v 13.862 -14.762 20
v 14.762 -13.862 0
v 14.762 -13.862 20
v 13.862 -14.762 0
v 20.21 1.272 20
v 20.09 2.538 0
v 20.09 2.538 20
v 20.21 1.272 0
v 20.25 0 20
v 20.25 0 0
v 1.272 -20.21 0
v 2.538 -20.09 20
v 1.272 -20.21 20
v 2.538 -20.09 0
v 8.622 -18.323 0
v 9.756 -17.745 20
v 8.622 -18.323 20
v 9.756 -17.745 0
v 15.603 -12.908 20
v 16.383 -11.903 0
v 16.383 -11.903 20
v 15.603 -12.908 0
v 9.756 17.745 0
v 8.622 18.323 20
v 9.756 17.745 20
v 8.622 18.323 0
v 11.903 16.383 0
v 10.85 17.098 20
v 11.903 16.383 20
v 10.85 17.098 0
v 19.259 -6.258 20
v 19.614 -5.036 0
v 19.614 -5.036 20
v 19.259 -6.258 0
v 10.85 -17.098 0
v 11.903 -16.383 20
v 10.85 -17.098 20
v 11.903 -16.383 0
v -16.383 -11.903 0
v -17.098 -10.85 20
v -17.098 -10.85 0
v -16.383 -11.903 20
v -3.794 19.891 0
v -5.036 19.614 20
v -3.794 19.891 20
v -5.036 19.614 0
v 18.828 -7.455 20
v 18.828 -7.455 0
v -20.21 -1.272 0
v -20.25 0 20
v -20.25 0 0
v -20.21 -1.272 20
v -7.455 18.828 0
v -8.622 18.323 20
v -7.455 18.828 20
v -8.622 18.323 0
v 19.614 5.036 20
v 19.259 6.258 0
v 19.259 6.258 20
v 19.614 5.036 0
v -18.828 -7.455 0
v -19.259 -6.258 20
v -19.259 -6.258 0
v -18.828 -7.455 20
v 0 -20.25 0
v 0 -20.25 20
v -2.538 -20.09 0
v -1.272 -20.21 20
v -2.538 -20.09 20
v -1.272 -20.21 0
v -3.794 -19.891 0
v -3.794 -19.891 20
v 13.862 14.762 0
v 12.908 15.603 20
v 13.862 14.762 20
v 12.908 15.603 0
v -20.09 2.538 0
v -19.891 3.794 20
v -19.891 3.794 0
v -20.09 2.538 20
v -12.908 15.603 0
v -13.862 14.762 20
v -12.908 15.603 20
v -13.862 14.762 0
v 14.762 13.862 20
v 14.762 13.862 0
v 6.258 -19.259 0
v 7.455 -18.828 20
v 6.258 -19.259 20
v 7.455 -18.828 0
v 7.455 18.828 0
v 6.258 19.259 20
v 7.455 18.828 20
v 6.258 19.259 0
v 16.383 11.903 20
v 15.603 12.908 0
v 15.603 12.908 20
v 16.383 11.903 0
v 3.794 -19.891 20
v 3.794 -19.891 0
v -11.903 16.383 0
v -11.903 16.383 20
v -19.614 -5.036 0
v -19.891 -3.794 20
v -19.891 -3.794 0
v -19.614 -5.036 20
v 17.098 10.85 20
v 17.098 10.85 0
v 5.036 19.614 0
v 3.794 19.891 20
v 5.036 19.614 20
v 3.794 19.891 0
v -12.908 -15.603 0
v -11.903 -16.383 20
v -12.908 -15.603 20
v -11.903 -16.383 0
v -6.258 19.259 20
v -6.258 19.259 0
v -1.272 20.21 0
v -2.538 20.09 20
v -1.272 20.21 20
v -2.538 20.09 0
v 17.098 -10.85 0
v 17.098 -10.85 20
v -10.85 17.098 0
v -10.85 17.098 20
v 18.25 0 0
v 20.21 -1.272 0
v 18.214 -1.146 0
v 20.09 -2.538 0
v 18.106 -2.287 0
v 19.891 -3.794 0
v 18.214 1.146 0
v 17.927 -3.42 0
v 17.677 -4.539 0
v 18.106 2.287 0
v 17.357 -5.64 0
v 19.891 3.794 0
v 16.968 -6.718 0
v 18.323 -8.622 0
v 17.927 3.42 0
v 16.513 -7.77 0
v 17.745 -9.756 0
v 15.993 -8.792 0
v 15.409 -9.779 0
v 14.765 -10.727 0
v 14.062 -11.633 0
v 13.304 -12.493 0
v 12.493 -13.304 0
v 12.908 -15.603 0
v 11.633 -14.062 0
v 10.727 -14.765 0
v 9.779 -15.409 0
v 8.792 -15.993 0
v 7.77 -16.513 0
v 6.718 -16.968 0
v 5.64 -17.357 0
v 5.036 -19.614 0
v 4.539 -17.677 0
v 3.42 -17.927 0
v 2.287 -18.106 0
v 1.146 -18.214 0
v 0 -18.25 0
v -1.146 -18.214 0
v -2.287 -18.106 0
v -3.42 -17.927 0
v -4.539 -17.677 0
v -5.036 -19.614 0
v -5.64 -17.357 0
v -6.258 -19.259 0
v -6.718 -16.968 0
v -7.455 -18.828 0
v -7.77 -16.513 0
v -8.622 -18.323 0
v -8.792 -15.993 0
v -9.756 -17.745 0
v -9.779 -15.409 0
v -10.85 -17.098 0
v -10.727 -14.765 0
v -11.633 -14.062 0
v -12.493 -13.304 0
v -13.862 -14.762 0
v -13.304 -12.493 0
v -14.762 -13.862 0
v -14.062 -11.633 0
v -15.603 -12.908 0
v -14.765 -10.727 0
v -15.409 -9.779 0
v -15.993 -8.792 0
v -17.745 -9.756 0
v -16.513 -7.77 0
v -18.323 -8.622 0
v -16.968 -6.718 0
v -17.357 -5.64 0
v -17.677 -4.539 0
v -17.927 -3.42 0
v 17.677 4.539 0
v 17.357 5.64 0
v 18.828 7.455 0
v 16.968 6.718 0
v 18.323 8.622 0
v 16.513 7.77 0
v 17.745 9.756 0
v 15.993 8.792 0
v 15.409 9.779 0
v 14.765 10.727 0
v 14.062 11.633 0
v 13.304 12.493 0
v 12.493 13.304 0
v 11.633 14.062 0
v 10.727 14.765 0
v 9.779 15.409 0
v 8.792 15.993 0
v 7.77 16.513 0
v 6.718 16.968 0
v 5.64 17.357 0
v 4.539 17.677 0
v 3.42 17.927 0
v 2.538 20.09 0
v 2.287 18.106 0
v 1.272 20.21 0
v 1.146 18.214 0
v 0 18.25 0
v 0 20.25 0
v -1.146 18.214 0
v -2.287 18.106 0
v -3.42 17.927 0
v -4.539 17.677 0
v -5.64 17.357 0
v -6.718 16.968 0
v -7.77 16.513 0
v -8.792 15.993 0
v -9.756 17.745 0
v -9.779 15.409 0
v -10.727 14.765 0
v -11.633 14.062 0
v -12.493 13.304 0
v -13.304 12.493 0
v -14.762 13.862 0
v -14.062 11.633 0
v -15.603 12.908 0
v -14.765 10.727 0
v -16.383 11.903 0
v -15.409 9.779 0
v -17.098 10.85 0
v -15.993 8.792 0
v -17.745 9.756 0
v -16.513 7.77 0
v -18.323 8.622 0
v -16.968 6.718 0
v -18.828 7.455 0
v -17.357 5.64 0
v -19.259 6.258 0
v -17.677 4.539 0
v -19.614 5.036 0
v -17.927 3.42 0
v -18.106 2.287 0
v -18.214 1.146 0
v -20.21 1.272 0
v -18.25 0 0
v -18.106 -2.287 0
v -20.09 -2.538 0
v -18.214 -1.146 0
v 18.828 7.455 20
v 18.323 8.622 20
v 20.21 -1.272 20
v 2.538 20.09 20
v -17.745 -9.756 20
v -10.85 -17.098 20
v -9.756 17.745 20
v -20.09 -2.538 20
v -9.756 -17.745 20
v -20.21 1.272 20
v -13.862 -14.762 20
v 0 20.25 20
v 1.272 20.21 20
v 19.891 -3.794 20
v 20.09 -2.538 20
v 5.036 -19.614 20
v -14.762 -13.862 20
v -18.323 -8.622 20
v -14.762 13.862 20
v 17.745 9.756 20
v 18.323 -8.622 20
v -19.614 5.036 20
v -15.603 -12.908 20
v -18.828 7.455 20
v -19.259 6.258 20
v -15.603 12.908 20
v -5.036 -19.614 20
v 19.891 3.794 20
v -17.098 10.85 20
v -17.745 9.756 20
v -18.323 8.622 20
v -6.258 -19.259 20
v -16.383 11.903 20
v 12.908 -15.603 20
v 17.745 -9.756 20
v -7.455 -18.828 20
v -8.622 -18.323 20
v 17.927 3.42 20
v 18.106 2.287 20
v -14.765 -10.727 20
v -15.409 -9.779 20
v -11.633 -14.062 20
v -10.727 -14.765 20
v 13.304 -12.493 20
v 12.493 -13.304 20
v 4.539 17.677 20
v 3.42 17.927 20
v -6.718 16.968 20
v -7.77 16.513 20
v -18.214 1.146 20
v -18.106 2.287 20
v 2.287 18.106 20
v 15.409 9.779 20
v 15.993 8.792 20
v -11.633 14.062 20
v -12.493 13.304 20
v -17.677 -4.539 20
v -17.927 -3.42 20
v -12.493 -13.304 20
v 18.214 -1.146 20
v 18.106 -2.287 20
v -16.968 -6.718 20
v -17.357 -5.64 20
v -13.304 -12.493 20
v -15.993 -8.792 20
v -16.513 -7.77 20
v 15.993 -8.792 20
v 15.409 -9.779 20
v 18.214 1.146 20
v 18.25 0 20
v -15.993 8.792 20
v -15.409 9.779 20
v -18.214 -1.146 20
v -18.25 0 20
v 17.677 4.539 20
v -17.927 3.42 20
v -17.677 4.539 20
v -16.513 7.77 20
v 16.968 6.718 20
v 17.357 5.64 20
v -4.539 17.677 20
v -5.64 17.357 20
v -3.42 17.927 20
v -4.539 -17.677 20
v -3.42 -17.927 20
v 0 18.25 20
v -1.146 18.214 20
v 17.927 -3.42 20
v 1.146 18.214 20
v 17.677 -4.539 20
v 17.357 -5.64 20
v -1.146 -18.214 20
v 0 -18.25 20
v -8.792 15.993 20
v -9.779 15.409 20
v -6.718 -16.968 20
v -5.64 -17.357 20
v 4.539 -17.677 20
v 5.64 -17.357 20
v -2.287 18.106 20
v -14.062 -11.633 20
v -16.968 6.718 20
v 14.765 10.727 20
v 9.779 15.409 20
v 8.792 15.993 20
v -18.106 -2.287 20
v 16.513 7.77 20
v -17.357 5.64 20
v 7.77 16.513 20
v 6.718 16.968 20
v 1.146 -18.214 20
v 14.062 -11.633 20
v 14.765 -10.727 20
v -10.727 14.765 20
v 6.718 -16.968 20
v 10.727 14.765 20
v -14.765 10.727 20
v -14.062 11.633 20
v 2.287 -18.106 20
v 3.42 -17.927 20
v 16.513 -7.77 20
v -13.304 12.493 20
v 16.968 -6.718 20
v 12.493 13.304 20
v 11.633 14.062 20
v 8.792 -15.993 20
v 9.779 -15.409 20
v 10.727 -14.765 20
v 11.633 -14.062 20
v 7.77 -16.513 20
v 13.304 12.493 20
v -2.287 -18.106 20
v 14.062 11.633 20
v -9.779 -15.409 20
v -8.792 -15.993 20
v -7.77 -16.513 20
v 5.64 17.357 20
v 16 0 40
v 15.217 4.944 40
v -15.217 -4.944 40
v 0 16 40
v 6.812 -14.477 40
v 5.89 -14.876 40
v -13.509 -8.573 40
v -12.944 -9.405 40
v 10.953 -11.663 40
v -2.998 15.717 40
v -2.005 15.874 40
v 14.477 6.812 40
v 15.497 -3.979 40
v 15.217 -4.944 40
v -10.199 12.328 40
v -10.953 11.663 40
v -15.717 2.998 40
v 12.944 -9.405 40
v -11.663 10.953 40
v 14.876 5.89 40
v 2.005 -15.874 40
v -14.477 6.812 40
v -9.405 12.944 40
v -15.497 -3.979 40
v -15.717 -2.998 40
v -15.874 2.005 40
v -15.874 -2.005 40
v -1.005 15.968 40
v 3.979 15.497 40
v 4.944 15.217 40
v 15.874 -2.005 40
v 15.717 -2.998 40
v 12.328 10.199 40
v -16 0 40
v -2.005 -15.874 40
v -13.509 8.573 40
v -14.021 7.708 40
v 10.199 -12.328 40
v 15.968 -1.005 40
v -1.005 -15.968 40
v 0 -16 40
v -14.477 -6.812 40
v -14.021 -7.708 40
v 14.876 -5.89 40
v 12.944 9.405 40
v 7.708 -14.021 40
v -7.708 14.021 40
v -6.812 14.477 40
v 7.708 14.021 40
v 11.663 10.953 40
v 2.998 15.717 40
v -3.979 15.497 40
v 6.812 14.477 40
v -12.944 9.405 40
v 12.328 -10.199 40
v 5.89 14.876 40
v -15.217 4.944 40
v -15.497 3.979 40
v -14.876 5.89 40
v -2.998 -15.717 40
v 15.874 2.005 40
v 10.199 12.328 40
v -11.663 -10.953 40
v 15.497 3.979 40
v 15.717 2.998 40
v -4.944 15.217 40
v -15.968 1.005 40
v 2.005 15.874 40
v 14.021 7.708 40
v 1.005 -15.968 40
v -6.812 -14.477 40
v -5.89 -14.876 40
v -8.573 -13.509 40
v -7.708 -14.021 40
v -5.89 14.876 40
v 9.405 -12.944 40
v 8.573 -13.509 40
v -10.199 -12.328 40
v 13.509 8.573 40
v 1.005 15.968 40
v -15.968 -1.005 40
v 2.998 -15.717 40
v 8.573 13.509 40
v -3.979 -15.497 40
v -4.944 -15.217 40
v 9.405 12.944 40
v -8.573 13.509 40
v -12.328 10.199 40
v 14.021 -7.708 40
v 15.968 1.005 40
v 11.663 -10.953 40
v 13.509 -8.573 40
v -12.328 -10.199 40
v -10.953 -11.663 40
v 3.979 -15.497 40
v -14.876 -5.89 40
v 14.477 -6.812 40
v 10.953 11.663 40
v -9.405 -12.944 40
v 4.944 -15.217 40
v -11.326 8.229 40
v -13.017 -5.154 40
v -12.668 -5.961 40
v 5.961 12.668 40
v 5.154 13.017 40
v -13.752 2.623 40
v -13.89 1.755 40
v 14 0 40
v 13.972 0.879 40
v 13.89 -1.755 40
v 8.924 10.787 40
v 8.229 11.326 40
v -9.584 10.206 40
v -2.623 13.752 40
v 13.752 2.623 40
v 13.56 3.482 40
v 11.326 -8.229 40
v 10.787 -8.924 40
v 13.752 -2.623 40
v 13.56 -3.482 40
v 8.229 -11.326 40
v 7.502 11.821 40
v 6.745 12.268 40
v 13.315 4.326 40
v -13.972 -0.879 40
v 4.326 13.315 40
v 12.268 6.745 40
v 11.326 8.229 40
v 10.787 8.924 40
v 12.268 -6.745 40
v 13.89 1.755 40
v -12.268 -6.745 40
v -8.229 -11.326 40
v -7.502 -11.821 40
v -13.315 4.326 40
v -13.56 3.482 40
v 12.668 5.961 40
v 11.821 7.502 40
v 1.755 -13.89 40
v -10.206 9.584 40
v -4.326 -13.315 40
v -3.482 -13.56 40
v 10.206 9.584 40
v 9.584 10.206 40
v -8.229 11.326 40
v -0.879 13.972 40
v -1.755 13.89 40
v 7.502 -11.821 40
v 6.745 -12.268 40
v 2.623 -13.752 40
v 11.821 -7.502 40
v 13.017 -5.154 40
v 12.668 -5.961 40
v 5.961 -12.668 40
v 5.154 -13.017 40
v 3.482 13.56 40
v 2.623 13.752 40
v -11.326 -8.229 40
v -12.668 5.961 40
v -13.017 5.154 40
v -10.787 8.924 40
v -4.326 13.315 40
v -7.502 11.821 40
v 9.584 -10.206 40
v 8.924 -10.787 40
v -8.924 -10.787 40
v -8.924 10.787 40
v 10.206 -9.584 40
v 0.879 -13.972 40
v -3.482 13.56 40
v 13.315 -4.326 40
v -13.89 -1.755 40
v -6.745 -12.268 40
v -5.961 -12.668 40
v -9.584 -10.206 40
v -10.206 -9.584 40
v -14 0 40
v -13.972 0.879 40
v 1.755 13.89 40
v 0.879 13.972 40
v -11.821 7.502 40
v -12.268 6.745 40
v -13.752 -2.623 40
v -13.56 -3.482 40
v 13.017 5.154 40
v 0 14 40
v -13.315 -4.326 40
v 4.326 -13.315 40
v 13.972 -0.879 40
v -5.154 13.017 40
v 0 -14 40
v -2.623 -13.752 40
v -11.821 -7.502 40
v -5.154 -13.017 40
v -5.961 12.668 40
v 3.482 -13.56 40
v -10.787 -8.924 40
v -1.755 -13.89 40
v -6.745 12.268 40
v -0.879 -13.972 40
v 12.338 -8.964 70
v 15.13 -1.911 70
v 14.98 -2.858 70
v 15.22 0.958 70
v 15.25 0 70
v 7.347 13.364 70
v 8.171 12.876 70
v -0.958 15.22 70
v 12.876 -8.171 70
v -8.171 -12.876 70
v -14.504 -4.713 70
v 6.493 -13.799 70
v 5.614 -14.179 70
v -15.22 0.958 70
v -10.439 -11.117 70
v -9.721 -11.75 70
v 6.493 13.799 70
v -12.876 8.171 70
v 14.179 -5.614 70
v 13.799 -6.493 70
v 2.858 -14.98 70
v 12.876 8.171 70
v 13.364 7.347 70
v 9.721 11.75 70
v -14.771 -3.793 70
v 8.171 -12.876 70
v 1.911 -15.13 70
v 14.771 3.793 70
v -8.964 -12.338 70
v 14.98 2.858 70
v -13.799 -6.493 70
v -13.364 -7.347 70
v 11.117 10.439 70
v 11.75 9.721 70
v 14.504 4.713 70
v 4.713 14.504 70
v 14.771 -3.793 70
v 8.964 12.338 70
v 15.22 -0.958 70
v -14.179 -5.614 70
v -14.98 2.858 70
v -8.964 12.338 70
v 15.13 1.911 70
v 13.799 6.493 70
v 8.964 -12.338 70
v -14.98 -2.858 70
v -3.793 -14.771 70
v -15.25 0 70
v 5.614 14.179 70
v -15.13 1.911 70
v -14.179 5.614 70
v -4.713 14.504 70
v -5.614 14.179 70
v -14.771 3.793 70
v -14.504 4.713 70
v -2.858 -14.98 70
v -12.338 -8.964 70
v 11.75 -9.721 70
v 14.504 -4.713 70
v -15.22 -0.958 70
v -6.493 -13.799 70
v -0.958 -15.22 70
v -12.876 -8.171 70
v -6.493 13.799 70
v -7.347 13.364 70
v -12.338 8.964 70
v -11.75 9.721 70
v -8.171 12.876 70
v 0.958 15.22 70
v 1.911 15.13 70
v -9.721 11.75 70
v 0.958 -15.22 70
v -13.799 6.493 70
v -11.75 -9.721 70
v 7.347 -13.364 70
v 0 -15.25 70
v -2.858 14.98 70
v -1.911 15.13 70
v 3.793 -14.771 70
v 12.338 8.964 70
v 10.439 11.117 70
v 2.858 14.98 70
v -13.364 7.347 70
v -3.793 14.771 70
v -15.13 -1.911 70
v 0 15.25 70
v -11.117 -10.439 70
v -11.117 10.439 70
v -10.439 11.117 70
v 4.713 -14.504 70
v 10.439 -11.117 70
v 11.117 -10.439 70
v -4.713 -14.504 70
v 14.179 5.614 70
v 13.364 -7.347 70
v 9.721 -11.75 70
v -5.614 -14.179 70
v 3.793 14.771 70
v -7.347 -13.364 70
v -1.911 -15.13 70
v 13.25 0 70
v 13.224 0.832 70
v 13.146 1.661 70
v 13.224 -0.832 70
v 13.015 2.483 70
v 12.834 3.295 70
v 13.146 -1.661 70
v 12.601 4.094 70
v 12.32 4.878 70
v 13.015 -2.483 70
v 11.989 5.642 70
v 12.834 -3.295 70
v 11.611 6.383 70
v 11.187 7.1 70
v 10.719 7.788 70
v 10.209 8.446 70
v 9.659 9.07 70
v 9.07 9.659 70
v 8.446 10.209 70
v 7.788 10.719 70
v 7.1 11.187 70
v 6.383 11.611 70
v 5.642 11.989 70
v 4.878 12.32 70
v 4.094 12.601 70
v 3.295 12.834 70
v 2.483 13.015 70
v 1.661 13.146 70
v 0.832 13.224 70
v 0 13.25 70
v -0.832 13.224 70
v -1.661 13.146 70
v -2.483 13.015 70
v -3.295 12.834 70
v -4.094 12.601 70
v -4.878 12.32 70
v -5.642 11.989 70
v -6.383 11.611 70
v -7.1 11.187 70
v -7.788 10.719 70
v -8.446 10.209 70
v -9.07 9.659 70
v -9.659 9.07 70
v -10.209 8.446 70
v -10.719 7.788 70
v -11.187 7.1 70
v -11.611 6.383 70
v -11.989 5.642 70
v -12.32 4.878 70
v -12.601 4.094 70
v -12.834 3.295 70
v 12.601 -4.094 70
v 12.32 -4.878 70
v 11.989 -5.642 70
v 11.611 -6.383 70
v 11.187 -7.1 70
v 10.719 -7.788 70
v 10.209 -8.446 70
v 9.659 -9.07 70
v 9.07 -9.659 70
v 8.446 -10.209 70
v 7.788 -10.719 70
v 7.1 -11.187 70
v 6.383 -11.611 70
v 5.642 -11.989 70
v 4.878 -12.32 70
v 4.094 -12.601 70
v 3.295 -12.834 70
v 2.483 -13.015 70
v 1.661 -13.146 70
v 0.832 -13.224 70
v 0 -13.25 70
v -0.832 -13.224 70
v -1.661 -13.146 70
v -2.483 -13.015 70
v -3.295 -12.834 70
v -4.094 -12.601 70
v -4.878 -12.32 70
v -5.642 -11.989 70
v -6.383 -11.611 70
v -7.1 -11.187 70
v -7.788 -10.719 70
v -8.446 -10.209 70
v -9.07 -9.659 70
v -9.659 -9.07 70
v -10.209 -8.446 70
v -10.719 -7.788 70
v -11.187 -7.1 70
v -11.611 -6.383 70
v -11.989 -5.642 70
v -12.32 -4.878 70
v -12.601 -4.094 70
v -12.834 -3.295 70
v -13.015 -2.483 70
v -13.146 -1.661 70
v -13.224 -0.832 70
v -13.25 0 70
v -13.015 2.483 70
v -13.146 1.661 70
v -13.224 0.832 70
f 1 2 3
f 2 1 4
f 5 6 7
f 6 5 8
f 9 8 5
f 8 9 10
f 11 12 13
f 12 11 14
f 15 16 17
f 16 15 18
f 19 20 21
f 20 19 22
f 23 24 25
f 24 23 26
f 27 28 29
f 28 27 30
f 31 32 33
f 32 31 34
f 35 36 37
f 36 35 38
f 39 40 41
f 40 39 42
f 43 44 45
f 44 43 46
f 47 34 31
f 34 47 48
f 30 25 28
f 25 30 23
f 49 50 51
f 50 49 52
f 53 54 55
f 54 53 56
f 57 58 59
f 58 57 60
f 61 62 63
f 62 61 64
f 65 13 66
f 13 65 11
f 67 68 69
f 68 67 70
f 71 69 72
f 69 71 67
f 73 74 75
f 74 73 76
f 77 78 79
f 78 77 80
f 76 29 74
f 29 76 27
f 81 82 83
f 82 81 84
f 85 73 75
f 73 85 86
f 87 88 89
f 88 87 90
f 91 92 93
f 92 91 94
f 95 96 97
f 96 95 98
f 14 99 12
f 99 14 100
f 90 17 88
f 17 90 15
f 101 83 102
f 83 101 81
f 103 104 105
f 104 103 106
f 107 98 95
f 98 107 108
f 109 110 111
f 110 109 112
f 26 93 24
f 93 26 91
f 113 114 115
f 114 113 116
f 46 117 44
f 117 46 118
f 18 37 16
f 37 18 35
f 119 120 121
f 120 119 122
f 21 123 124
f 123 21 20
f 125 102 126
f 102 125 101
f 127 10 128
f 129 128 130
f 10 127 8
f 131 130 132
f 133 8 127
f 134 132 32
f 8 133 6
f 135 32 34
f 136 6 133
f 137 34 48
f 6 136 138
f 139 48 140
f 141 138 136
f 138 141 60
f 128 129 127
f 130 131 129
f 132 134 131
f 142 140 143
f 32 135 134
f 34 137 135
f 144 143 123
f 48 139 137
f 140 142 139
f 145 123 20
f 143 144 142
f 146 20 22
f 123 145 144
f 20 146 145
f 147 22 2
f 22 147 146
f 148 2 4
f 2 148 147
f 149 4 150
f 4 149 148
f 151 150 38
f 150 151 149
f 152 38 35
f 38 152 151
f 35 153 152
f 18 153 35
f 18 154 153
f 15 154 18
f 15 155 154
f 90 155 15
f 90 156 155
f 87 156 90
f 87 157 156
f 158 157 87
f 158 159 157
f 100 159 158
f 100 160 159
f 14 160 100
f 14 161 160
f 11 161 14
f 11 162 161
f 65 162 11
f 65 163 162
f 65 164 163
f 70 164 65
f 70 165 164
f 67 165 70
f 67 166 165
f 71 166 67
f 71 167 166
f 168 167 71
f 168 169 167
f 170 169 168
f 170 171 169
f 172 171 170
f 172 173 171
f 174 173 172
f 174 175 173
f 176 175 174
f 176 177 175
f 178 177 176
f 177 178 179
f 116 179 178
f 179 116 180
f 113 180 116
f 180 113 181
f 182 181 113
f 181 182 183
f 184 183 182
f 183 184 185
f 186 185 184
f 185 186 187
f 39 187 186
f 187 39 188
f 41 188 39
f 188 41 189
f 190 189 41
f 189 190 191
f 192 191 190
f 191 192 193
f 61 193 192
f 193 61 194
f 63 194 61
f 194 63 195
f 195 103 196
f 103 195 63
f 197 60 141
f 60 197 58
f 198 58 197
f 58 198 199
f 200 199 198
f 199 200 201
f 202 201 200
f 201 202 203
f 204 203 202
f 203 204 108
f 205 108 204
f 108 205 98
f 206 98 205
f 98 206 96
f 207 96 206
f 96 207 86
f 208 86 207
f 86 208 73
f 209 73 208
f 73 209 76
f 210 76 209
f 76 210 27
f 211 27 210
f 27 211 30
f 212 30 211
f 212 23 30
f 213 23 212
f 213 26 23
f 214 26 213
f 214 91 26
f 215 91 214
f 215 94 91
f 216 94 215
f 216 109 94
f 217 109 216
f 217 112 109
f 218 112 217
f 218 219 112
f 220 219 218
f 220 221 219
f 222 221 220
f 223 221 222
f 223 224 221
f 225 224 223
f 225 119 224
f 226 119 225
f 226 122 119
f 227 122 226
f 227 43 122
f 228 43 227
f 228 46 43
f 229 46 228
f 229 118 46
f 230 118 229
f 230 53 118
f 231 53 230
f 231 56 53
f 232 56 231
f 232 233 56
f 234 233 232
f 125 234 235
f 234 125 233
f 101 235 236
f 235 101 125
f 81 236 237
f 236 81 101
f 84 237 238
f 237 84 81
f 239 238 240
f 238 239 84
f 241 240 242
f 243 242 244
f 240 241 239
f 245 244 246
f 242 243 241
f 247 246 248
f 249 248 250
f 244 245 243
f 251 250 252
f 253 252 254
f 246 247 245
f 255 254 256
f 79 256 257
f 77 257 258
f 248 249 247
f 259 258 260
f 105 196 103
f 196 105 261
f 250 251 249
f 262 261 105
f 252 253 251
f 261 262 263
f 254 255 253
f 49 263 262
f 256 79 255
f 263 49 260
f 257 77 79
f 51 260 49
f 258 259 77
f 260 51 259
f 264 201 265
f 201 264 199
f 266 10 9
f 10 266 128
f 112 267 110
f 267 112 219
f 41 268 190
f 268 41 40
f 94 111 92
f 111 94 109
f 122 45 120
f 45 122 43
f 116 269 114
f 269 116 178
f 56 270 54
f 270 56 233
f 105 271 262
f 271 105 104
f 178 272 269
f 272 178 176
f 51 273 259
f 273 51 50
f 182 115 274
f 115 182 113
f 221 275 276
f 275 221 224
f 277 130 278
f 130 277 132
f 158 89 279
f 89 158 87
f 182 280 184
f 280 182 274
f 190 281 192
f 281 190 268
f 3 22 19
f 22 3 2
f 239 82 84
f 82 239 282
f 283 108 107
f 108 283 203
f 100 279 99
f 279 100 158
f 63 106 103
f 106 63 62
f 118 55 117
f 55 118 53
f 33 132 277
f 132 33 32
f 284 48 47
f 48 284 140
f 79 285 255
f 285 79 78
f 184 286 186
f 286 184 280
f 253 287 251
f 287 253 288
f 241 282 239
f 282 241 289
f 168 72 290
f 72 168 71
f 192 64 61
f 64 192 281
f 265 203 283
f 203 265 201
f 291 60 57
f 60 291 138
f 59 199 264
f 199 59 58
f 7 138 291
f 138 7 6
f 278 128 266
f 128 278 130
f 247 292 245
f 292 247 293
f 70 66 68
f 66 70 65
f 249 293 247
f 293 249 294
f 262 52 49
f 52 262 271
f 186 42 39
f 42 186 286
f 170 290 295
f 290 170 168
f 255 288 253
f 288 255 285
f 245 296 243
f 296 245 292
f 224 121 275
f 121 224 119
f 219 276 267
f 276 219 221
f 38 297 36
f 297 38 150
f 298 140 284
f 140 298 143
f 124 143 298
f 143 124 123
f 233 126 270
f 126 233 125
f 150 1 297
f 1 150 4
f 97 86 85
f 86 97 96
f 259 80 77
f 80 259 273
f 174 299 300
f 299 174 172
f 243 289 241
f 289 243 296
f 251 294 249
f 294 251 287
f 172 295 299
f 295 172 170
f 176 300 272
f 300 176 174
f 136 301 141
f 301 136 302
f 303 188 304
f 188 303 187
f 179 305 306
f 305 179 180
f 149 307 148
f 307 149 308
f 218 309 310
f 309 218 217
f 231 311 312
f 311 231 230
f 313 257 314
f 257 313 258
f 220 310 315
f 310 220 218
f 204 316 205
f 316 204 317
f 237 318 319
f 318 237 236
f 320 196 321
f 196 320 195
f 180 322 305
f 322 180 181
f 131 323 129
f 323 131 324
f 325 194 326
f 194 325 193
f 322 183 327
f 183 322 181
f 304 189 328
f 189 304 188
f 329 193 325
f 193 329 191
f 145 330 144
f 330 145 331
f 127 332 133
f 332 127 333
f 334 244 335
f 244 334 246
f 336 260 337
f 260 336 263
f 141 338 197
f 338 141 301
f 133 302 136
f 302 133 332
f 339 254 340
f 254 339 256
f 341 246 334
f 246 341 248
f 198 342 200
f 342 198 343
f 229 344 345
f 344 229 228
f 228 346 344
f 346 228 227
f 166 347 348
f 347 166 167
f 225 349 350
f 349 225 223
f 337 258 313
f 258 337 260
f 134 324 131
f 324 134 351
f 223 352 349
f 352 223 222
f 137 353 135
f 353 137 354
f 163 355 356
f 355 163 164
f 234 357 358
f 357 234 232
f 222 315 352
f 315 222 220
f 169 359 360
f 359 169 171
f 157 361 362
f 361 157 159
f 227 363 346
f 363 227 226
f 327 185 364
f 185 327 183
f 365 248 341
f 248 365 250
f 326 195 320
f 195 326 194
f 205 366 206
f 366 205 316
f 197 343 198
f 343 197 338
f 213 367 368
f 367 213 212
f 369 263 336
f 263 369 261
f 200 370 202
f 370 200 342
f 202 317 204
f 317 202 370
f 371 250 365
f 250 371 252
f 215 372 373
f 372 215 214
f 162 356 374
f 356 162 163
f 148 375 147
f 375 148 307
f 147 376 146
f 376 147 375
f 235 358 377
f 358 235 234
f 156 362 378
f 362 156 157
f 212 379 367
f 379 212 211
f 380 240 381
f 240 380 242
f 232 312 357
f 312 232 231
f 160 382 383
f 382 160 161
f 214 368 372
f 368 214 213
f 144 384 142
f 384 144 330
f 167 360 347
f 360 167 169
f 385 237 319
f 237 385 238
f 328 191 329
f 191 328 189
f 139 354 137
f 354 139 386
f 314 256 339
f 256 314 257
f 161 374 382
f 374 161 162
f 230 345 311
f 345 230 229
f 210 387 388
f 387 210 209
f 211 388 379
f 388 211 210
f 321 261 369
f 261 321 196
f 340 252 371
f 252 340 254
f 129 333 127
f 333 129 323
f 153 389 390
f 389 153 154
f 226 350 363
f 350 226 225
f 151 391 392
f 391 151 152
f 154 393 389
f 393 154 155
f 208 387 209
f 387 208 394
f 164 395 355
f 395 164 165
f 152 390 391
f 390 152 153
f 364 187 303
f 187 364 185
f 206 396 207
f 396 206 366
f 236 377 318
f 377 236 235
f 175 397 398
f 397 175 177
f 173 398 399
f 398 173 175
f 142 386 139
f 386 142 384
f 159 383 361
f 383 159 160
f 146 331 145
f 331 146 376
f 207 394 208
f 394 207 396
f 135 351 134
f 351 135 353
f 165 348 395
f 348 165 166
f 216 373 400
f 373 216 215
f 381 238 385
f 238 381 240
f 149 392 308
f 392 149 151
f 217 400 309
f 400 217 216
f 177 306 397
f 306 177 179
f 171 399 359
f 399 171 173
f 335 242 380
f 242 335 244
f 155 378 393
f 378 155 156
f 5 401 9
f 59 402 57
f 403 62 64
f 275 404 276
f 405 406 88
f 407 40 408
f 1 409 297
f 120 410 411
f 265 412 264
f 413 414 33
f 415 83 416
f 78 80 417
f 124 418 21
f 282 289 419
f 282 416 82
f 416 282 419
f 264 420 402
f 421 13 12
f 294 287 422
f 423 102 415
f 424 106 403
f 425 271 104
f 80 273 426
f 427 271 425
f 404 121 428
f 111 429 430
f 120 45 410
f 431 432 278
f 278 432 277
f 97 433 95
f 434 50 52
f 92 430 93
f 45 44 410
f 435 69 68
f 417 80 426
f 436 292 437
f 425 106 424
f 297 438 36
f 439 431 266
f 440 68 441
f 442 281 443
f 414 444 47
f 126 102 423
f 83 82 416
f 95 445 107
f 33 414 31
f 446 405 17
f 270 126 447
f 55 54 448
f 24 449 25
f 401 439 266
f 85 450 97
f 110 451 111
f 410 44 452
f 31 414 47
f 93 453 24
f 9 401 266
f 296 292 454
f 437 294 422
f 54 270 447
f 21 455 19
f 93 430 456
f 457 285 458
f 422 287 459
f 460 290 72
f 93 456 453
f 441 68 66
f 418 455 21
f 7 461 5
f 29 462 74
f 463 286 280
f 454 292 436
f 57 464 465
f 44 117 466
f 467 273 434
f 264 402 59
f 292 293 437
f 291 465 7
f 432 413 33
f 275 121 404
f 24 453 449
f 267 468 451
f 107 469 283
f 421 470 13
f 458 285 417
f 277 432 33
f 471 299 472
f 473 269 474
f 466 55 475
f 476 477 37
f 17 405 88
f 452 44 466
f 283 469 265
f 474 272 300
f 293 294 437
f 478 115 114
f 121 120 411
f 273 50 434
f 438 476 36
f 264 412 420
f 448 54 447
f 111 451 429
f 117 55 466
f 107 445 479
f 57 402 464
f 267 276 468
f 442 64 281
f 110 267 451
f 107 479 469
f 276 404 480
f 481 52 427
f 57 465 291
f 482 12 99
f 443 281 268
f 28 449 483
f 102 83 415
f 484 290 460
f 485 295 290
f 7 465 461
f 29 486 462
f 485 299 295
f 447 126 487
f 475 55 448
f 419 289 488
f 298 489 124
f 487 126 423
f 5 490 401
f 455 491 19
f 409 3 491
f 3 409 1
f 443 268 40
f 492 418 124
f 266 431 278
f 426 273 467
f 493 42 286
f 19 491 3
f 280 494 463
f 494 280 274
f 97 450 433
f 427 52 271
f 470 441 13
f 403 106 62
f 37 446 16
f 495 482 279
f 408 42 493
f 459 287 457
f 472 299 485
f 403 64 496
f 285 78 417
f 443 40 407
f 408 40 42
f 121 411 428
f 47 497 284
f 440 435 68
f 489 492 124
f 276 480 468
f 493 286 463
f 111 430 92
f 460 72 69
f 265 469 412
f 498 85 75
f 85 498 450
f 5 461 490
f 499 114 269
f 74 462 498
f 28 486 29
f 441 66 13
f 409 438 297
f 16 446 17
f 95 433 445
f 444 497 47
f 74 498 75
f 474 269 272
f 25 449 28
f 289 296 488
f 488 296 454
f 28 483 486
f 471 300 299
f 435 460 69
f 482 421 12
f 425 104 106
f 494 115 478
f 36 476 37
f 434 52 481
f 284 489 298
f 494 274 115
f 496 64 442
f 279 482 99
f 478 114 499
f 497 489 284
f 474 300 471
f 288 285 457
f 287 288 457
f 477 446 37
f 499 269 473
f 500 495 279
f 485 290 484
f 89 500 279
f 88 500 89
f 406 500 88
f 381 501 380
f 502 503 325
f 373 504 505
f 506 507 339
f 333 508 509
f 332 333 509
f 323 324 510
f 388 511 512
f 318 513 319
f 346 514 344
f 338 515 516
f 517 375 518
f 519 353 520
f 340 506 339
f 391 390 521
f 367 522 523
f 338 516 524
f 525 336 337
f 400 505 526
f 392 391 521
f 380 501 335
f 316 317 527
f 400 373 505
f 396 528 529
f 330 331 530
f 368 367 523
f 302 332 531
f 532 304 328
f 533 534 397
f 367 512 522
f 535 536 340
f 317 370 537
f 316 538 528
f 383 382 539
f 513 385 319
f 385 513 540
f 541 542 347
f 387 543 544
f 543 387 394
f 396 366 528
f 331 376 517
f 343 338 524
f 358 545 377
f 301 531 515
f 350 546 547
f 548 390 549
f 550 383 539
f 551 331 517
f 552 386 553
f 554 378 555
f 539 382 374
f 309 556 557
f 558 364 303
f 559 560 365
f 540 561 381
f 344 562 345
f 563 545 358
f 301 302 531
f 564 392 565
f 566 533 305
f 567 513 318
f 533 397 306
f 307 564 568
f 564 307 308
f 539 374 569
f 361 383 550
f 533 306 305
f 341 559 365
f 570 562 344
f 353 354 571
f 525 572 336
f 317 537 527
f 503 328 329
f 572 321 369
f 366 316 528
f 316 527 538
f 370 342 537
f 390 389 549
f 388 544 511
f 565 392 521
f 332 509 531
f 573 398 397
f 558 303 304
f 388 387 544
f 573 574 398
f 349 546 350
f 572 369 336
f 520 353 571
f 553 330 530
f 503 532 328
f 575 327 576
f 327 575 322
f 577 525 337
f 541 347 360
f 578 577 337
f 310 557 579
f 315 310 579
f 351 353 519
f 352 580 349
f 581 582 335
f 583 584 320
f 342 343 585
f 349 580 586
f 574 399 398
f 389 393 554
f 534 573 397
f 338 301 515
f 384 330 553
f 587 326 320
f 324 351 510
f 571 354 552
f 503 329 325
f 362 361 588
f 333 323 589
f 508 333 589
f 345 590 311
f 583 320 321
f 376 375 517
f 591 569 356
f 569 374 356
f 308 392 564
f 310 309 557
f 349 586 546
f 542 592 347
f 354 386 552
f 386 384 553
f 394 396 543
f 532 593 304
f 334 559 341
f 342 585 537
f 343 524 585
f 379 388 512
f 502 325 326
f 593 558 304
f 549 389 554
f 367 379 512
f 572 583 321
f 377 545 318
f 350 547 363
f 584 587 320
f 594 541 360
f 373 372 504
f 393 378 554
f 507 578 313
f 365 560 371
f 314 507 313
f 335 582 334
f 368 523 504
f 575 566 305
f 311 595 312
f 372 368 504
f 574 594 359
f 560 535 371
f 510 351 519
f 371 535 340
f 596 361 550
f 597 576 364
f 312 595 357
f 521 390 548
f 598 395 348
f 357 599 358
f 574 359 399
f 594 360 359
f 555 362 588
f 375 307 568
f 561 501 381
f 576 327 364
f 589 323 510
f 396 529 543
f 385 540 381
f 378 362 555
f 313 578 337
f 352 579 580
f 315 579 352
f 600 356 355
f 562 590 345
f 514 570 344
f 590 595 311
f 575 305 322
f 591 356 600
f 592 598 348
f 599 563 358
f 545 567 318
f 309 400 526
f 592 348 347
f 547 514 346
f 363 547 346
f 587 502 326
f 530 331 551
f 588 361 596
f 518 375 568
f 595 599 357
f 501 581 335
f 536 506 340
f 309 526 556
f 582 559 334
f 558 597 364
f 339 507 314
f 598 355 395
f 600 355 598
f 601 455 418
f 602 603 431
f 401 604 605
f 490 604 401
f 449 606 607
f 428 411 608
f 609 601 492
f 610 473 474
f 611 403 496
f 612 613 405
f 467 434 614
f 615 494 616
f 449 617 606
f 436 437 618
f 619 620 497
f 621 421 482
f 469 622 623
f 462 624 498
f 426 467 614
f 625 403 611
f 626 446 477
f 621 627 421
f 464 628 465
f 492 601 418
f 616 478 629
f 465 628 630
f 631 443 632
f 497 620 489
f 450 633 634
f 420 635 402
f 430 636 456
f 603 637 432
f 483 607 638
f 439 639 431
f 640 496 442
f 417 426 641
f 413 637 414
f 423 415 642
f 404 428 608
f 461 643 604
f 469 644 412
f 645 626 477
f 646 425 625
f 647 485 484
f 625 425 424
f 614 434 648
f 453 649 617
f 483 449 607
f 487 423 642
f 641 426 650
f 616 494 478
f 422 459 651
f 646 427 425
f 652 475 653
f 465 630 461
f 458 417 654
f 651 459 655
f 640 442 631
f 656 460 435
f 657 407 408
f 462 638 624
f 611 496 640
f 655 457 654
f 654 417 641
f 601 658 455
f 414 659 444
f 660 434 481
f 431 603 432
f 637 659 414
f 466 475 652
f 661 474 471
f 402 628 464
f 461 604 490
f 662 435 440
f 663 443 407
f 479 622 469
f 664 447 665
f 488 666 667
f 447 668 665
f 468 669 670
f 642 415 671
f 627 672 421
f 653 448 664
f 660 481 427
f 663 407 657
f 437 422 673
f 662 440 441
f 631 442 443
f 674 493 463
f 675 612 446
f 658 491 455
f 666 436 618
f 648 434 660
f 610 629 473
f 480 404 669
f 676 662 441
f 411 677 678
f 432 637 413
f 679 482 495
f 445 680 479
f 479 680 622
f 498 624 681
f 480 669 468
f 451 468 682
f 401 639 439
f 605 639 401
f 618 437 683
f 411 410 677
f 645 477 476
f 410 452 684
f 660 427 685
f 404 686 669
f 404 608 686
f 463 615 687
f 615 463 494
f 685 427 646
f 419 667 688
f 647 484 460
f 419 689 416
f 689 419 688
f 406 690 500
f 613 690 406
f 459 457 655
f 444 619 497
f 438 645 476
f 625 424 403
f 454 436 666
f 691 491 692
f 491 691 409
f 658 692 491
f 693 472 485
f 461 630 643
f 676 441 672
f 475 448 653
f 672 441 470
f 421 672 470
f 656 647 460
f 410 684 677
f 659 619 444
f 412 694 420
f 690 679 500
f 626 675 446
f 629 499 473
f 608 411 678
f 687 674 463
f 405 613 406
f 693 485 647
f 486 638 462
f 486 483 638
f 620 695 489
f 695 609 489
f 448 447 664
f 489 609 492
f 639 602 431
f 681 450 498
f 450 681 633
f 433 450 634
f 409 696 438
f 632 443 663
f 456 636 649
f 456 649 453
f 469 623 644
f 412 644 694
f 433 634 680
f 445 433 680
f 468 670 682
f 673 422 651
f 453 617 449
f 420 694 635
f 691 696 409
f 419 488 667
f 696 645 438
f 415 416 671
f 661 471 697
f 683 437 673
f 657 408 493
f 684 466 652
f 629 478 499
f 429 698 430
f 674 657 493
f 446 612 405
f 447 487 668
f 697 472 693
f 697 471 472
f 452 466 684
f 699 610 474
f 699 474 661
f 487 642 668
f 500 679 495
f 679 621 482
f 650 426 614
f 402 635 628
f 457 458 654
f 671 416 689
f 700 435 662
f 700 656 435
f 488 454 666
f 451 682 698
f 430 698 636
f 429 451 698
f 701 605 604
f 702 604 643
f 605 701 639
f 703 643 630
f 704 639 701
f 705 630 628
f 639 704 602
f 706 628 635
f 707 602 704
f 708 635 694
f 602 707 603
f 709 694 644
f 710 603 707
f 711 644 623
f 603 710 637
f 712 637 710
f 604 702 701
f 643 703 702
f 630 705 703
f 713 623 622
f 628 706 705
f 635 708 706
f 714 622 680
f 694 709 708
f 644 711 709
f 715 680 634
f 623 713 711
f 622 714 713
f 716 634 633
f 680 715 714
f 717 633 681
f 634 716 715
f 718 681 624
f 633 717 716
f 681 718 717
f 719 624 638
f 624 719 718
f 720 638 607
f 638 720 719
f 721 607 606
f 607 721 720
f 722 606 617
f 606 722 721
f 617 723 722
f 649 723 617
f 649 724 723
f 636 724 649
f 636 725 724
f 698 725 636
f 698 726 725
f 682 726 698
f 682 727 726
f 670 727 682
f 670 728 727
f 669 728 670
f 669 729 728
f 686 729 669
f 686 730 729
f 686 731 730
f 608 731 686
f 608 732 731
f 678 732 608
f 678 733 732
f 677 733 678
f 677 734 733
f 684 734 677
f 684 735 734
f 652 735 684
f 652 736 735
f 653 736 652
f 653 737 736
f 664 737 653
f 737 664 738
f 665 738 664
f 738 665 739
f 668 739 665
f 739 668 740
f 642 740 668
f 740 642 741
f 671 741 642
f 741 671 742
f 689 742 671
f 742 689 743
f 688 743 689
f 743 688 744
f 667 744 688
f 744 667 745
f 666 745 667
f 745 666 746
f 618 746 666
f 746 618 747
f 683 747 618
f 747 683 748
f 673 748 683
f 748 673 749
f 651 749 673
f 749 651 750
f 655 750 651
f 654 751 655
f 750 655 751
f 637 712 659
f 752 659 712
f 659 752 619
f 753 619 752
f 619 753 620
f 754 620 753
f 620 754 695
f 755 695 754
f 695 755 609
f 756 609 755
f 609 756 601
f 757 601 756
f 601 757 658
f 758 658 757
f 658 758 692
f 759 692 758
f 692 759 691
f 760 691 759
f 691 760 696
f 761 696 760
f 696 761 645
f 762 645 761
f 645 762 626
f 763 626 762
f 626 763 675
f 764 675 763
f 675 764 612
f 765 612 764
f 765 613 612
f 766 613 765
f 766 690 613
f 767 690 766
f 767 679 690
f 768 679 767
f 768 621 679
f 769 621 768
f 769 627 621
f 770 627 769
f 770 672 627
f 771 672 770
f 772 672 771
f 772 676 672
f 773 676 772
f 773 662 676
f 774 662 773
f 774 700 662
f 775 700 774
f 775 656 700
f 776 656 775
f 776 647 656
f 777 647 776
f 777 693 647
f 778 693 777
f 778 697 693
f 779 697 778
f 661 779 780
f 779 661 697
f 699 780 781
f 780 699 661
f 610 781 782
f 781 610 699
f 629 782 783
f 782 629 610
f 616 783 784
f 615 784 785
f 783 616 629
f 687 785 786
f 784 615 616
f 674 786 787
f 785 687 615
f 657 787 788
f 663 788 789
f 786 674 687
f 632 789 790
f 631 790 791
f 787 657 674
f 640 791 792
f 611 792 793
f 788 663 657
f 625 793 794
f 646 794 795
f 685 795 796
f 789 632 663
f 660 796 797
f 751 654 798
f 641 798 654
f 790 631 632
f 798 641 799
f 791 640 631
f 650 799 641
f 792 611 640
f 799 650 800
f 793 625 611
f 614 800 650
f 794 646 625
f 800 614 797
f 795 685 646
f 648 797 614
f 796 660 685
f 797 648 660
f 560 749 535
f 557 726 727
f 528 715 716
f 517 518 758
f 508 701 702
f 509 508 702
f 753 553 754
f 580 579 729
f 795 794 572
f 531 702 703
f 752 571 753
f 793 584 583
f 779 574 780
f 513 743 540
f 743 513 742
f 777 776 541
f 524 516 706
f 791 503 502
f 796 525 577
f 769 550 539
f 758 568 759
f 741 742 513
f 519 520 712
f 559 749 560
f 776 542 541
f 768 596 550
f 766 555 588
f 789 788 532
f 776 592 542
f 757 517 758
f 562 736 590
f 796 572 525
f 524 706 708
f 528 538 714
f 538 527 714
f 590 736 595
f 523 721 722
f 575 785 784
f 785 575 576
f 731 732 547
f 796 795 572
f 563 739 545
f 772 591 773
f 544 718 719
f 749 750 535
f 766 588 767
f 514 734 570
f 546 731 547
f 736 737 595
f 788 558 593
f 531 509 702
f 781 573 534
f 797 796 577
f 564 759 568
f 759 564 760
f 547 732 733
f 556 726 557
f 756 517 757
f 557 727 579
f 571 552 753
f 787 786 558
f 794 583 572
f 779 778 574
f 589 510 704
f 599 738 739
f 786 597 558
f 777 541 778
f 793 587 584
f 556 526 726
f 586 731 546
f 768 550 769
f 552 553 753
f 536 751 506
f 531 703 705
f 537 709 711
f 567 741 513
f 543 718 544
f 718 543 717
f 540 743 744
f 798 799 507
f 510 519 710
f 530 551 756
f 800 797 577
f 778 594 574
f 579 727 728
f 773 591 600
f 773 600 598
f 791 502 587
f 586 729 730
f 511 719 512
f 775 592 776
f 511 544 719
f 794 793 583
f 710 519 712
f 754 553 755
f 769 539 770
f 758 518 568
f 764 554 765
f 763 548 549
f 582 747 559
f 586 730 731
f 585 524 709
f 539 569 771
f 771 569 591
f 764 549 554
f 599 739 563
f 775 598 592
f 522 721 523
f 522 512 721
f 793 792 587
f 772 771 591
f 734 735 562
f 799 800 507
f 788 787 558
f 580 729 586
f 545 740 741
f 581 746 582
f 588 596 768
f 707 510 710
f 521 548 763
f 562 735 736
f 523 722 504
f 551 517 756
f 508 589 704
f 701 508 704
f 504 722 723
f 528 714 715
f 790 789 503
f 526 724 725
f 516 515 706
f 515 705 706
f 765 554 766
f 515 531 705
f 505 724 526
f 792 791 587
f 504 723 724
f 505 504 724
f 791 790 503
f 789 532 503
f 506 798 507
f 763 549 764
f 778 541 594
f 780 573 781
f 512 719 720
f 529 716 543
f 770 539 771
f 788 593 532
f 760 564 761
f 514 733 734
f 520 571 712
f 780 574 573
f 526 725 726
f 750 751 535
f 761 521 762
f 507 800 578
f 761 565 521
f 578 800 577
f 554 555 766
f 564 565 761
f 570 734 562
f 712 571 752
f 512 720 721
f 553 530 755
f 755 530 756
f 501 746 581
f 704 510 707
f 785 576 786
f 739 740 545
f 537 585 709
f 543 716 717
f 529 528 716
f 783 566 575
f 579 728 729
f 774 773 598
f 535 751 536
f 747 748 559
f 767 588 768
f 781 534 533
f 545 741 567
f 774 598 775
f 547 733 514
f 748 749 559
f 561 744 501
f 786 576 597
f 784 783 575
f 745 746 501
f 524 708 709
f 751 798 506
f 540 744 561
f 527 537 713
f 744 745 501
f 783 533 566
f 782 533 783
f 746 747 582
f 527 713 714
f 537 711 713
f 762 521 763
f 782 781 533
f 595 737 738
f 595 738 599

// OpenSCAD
$fn=100;
wall_thickness = 2;
section_length = 20;
end_taper = 1.5;

start_int_dia = 36.5;
start_ext_dia = start_int_dia + 2 * wall_thickness;

end_ext_dia = 32.0;
end_int_dia = end_ext_dia - 2 * wall_thickness;


module start_tube() {
    difference() {
        cylinder(section_length, d = start_ext_dia);
        cylinder(section_length, d = start_int_dia);
    }
}

module middle_tube() {
    difference() {
        cylinder(section_length, d1 = start_ext_dia, d2 = end_ext_dia);
        cylinder(section_length, d1 = start_int_dia, d2 = end_int_dia);
    }
}

module end_tube() {
    difference() {
        cylinder(section_length*1.5, d1 = end_ext_dia, d2 = end_ext_dia-end_taper);
        cylinder(section_length*1.5, d1 = end_int_dia, d2 = end_int_dia-end_taper);
    }
}

module adaptor() {
    start_tube();
    translate([0, 0, section_length]) middle_tube();
    translate([0, 0, section_length*2]) end_tube();    
}


adaptor();
    
    
